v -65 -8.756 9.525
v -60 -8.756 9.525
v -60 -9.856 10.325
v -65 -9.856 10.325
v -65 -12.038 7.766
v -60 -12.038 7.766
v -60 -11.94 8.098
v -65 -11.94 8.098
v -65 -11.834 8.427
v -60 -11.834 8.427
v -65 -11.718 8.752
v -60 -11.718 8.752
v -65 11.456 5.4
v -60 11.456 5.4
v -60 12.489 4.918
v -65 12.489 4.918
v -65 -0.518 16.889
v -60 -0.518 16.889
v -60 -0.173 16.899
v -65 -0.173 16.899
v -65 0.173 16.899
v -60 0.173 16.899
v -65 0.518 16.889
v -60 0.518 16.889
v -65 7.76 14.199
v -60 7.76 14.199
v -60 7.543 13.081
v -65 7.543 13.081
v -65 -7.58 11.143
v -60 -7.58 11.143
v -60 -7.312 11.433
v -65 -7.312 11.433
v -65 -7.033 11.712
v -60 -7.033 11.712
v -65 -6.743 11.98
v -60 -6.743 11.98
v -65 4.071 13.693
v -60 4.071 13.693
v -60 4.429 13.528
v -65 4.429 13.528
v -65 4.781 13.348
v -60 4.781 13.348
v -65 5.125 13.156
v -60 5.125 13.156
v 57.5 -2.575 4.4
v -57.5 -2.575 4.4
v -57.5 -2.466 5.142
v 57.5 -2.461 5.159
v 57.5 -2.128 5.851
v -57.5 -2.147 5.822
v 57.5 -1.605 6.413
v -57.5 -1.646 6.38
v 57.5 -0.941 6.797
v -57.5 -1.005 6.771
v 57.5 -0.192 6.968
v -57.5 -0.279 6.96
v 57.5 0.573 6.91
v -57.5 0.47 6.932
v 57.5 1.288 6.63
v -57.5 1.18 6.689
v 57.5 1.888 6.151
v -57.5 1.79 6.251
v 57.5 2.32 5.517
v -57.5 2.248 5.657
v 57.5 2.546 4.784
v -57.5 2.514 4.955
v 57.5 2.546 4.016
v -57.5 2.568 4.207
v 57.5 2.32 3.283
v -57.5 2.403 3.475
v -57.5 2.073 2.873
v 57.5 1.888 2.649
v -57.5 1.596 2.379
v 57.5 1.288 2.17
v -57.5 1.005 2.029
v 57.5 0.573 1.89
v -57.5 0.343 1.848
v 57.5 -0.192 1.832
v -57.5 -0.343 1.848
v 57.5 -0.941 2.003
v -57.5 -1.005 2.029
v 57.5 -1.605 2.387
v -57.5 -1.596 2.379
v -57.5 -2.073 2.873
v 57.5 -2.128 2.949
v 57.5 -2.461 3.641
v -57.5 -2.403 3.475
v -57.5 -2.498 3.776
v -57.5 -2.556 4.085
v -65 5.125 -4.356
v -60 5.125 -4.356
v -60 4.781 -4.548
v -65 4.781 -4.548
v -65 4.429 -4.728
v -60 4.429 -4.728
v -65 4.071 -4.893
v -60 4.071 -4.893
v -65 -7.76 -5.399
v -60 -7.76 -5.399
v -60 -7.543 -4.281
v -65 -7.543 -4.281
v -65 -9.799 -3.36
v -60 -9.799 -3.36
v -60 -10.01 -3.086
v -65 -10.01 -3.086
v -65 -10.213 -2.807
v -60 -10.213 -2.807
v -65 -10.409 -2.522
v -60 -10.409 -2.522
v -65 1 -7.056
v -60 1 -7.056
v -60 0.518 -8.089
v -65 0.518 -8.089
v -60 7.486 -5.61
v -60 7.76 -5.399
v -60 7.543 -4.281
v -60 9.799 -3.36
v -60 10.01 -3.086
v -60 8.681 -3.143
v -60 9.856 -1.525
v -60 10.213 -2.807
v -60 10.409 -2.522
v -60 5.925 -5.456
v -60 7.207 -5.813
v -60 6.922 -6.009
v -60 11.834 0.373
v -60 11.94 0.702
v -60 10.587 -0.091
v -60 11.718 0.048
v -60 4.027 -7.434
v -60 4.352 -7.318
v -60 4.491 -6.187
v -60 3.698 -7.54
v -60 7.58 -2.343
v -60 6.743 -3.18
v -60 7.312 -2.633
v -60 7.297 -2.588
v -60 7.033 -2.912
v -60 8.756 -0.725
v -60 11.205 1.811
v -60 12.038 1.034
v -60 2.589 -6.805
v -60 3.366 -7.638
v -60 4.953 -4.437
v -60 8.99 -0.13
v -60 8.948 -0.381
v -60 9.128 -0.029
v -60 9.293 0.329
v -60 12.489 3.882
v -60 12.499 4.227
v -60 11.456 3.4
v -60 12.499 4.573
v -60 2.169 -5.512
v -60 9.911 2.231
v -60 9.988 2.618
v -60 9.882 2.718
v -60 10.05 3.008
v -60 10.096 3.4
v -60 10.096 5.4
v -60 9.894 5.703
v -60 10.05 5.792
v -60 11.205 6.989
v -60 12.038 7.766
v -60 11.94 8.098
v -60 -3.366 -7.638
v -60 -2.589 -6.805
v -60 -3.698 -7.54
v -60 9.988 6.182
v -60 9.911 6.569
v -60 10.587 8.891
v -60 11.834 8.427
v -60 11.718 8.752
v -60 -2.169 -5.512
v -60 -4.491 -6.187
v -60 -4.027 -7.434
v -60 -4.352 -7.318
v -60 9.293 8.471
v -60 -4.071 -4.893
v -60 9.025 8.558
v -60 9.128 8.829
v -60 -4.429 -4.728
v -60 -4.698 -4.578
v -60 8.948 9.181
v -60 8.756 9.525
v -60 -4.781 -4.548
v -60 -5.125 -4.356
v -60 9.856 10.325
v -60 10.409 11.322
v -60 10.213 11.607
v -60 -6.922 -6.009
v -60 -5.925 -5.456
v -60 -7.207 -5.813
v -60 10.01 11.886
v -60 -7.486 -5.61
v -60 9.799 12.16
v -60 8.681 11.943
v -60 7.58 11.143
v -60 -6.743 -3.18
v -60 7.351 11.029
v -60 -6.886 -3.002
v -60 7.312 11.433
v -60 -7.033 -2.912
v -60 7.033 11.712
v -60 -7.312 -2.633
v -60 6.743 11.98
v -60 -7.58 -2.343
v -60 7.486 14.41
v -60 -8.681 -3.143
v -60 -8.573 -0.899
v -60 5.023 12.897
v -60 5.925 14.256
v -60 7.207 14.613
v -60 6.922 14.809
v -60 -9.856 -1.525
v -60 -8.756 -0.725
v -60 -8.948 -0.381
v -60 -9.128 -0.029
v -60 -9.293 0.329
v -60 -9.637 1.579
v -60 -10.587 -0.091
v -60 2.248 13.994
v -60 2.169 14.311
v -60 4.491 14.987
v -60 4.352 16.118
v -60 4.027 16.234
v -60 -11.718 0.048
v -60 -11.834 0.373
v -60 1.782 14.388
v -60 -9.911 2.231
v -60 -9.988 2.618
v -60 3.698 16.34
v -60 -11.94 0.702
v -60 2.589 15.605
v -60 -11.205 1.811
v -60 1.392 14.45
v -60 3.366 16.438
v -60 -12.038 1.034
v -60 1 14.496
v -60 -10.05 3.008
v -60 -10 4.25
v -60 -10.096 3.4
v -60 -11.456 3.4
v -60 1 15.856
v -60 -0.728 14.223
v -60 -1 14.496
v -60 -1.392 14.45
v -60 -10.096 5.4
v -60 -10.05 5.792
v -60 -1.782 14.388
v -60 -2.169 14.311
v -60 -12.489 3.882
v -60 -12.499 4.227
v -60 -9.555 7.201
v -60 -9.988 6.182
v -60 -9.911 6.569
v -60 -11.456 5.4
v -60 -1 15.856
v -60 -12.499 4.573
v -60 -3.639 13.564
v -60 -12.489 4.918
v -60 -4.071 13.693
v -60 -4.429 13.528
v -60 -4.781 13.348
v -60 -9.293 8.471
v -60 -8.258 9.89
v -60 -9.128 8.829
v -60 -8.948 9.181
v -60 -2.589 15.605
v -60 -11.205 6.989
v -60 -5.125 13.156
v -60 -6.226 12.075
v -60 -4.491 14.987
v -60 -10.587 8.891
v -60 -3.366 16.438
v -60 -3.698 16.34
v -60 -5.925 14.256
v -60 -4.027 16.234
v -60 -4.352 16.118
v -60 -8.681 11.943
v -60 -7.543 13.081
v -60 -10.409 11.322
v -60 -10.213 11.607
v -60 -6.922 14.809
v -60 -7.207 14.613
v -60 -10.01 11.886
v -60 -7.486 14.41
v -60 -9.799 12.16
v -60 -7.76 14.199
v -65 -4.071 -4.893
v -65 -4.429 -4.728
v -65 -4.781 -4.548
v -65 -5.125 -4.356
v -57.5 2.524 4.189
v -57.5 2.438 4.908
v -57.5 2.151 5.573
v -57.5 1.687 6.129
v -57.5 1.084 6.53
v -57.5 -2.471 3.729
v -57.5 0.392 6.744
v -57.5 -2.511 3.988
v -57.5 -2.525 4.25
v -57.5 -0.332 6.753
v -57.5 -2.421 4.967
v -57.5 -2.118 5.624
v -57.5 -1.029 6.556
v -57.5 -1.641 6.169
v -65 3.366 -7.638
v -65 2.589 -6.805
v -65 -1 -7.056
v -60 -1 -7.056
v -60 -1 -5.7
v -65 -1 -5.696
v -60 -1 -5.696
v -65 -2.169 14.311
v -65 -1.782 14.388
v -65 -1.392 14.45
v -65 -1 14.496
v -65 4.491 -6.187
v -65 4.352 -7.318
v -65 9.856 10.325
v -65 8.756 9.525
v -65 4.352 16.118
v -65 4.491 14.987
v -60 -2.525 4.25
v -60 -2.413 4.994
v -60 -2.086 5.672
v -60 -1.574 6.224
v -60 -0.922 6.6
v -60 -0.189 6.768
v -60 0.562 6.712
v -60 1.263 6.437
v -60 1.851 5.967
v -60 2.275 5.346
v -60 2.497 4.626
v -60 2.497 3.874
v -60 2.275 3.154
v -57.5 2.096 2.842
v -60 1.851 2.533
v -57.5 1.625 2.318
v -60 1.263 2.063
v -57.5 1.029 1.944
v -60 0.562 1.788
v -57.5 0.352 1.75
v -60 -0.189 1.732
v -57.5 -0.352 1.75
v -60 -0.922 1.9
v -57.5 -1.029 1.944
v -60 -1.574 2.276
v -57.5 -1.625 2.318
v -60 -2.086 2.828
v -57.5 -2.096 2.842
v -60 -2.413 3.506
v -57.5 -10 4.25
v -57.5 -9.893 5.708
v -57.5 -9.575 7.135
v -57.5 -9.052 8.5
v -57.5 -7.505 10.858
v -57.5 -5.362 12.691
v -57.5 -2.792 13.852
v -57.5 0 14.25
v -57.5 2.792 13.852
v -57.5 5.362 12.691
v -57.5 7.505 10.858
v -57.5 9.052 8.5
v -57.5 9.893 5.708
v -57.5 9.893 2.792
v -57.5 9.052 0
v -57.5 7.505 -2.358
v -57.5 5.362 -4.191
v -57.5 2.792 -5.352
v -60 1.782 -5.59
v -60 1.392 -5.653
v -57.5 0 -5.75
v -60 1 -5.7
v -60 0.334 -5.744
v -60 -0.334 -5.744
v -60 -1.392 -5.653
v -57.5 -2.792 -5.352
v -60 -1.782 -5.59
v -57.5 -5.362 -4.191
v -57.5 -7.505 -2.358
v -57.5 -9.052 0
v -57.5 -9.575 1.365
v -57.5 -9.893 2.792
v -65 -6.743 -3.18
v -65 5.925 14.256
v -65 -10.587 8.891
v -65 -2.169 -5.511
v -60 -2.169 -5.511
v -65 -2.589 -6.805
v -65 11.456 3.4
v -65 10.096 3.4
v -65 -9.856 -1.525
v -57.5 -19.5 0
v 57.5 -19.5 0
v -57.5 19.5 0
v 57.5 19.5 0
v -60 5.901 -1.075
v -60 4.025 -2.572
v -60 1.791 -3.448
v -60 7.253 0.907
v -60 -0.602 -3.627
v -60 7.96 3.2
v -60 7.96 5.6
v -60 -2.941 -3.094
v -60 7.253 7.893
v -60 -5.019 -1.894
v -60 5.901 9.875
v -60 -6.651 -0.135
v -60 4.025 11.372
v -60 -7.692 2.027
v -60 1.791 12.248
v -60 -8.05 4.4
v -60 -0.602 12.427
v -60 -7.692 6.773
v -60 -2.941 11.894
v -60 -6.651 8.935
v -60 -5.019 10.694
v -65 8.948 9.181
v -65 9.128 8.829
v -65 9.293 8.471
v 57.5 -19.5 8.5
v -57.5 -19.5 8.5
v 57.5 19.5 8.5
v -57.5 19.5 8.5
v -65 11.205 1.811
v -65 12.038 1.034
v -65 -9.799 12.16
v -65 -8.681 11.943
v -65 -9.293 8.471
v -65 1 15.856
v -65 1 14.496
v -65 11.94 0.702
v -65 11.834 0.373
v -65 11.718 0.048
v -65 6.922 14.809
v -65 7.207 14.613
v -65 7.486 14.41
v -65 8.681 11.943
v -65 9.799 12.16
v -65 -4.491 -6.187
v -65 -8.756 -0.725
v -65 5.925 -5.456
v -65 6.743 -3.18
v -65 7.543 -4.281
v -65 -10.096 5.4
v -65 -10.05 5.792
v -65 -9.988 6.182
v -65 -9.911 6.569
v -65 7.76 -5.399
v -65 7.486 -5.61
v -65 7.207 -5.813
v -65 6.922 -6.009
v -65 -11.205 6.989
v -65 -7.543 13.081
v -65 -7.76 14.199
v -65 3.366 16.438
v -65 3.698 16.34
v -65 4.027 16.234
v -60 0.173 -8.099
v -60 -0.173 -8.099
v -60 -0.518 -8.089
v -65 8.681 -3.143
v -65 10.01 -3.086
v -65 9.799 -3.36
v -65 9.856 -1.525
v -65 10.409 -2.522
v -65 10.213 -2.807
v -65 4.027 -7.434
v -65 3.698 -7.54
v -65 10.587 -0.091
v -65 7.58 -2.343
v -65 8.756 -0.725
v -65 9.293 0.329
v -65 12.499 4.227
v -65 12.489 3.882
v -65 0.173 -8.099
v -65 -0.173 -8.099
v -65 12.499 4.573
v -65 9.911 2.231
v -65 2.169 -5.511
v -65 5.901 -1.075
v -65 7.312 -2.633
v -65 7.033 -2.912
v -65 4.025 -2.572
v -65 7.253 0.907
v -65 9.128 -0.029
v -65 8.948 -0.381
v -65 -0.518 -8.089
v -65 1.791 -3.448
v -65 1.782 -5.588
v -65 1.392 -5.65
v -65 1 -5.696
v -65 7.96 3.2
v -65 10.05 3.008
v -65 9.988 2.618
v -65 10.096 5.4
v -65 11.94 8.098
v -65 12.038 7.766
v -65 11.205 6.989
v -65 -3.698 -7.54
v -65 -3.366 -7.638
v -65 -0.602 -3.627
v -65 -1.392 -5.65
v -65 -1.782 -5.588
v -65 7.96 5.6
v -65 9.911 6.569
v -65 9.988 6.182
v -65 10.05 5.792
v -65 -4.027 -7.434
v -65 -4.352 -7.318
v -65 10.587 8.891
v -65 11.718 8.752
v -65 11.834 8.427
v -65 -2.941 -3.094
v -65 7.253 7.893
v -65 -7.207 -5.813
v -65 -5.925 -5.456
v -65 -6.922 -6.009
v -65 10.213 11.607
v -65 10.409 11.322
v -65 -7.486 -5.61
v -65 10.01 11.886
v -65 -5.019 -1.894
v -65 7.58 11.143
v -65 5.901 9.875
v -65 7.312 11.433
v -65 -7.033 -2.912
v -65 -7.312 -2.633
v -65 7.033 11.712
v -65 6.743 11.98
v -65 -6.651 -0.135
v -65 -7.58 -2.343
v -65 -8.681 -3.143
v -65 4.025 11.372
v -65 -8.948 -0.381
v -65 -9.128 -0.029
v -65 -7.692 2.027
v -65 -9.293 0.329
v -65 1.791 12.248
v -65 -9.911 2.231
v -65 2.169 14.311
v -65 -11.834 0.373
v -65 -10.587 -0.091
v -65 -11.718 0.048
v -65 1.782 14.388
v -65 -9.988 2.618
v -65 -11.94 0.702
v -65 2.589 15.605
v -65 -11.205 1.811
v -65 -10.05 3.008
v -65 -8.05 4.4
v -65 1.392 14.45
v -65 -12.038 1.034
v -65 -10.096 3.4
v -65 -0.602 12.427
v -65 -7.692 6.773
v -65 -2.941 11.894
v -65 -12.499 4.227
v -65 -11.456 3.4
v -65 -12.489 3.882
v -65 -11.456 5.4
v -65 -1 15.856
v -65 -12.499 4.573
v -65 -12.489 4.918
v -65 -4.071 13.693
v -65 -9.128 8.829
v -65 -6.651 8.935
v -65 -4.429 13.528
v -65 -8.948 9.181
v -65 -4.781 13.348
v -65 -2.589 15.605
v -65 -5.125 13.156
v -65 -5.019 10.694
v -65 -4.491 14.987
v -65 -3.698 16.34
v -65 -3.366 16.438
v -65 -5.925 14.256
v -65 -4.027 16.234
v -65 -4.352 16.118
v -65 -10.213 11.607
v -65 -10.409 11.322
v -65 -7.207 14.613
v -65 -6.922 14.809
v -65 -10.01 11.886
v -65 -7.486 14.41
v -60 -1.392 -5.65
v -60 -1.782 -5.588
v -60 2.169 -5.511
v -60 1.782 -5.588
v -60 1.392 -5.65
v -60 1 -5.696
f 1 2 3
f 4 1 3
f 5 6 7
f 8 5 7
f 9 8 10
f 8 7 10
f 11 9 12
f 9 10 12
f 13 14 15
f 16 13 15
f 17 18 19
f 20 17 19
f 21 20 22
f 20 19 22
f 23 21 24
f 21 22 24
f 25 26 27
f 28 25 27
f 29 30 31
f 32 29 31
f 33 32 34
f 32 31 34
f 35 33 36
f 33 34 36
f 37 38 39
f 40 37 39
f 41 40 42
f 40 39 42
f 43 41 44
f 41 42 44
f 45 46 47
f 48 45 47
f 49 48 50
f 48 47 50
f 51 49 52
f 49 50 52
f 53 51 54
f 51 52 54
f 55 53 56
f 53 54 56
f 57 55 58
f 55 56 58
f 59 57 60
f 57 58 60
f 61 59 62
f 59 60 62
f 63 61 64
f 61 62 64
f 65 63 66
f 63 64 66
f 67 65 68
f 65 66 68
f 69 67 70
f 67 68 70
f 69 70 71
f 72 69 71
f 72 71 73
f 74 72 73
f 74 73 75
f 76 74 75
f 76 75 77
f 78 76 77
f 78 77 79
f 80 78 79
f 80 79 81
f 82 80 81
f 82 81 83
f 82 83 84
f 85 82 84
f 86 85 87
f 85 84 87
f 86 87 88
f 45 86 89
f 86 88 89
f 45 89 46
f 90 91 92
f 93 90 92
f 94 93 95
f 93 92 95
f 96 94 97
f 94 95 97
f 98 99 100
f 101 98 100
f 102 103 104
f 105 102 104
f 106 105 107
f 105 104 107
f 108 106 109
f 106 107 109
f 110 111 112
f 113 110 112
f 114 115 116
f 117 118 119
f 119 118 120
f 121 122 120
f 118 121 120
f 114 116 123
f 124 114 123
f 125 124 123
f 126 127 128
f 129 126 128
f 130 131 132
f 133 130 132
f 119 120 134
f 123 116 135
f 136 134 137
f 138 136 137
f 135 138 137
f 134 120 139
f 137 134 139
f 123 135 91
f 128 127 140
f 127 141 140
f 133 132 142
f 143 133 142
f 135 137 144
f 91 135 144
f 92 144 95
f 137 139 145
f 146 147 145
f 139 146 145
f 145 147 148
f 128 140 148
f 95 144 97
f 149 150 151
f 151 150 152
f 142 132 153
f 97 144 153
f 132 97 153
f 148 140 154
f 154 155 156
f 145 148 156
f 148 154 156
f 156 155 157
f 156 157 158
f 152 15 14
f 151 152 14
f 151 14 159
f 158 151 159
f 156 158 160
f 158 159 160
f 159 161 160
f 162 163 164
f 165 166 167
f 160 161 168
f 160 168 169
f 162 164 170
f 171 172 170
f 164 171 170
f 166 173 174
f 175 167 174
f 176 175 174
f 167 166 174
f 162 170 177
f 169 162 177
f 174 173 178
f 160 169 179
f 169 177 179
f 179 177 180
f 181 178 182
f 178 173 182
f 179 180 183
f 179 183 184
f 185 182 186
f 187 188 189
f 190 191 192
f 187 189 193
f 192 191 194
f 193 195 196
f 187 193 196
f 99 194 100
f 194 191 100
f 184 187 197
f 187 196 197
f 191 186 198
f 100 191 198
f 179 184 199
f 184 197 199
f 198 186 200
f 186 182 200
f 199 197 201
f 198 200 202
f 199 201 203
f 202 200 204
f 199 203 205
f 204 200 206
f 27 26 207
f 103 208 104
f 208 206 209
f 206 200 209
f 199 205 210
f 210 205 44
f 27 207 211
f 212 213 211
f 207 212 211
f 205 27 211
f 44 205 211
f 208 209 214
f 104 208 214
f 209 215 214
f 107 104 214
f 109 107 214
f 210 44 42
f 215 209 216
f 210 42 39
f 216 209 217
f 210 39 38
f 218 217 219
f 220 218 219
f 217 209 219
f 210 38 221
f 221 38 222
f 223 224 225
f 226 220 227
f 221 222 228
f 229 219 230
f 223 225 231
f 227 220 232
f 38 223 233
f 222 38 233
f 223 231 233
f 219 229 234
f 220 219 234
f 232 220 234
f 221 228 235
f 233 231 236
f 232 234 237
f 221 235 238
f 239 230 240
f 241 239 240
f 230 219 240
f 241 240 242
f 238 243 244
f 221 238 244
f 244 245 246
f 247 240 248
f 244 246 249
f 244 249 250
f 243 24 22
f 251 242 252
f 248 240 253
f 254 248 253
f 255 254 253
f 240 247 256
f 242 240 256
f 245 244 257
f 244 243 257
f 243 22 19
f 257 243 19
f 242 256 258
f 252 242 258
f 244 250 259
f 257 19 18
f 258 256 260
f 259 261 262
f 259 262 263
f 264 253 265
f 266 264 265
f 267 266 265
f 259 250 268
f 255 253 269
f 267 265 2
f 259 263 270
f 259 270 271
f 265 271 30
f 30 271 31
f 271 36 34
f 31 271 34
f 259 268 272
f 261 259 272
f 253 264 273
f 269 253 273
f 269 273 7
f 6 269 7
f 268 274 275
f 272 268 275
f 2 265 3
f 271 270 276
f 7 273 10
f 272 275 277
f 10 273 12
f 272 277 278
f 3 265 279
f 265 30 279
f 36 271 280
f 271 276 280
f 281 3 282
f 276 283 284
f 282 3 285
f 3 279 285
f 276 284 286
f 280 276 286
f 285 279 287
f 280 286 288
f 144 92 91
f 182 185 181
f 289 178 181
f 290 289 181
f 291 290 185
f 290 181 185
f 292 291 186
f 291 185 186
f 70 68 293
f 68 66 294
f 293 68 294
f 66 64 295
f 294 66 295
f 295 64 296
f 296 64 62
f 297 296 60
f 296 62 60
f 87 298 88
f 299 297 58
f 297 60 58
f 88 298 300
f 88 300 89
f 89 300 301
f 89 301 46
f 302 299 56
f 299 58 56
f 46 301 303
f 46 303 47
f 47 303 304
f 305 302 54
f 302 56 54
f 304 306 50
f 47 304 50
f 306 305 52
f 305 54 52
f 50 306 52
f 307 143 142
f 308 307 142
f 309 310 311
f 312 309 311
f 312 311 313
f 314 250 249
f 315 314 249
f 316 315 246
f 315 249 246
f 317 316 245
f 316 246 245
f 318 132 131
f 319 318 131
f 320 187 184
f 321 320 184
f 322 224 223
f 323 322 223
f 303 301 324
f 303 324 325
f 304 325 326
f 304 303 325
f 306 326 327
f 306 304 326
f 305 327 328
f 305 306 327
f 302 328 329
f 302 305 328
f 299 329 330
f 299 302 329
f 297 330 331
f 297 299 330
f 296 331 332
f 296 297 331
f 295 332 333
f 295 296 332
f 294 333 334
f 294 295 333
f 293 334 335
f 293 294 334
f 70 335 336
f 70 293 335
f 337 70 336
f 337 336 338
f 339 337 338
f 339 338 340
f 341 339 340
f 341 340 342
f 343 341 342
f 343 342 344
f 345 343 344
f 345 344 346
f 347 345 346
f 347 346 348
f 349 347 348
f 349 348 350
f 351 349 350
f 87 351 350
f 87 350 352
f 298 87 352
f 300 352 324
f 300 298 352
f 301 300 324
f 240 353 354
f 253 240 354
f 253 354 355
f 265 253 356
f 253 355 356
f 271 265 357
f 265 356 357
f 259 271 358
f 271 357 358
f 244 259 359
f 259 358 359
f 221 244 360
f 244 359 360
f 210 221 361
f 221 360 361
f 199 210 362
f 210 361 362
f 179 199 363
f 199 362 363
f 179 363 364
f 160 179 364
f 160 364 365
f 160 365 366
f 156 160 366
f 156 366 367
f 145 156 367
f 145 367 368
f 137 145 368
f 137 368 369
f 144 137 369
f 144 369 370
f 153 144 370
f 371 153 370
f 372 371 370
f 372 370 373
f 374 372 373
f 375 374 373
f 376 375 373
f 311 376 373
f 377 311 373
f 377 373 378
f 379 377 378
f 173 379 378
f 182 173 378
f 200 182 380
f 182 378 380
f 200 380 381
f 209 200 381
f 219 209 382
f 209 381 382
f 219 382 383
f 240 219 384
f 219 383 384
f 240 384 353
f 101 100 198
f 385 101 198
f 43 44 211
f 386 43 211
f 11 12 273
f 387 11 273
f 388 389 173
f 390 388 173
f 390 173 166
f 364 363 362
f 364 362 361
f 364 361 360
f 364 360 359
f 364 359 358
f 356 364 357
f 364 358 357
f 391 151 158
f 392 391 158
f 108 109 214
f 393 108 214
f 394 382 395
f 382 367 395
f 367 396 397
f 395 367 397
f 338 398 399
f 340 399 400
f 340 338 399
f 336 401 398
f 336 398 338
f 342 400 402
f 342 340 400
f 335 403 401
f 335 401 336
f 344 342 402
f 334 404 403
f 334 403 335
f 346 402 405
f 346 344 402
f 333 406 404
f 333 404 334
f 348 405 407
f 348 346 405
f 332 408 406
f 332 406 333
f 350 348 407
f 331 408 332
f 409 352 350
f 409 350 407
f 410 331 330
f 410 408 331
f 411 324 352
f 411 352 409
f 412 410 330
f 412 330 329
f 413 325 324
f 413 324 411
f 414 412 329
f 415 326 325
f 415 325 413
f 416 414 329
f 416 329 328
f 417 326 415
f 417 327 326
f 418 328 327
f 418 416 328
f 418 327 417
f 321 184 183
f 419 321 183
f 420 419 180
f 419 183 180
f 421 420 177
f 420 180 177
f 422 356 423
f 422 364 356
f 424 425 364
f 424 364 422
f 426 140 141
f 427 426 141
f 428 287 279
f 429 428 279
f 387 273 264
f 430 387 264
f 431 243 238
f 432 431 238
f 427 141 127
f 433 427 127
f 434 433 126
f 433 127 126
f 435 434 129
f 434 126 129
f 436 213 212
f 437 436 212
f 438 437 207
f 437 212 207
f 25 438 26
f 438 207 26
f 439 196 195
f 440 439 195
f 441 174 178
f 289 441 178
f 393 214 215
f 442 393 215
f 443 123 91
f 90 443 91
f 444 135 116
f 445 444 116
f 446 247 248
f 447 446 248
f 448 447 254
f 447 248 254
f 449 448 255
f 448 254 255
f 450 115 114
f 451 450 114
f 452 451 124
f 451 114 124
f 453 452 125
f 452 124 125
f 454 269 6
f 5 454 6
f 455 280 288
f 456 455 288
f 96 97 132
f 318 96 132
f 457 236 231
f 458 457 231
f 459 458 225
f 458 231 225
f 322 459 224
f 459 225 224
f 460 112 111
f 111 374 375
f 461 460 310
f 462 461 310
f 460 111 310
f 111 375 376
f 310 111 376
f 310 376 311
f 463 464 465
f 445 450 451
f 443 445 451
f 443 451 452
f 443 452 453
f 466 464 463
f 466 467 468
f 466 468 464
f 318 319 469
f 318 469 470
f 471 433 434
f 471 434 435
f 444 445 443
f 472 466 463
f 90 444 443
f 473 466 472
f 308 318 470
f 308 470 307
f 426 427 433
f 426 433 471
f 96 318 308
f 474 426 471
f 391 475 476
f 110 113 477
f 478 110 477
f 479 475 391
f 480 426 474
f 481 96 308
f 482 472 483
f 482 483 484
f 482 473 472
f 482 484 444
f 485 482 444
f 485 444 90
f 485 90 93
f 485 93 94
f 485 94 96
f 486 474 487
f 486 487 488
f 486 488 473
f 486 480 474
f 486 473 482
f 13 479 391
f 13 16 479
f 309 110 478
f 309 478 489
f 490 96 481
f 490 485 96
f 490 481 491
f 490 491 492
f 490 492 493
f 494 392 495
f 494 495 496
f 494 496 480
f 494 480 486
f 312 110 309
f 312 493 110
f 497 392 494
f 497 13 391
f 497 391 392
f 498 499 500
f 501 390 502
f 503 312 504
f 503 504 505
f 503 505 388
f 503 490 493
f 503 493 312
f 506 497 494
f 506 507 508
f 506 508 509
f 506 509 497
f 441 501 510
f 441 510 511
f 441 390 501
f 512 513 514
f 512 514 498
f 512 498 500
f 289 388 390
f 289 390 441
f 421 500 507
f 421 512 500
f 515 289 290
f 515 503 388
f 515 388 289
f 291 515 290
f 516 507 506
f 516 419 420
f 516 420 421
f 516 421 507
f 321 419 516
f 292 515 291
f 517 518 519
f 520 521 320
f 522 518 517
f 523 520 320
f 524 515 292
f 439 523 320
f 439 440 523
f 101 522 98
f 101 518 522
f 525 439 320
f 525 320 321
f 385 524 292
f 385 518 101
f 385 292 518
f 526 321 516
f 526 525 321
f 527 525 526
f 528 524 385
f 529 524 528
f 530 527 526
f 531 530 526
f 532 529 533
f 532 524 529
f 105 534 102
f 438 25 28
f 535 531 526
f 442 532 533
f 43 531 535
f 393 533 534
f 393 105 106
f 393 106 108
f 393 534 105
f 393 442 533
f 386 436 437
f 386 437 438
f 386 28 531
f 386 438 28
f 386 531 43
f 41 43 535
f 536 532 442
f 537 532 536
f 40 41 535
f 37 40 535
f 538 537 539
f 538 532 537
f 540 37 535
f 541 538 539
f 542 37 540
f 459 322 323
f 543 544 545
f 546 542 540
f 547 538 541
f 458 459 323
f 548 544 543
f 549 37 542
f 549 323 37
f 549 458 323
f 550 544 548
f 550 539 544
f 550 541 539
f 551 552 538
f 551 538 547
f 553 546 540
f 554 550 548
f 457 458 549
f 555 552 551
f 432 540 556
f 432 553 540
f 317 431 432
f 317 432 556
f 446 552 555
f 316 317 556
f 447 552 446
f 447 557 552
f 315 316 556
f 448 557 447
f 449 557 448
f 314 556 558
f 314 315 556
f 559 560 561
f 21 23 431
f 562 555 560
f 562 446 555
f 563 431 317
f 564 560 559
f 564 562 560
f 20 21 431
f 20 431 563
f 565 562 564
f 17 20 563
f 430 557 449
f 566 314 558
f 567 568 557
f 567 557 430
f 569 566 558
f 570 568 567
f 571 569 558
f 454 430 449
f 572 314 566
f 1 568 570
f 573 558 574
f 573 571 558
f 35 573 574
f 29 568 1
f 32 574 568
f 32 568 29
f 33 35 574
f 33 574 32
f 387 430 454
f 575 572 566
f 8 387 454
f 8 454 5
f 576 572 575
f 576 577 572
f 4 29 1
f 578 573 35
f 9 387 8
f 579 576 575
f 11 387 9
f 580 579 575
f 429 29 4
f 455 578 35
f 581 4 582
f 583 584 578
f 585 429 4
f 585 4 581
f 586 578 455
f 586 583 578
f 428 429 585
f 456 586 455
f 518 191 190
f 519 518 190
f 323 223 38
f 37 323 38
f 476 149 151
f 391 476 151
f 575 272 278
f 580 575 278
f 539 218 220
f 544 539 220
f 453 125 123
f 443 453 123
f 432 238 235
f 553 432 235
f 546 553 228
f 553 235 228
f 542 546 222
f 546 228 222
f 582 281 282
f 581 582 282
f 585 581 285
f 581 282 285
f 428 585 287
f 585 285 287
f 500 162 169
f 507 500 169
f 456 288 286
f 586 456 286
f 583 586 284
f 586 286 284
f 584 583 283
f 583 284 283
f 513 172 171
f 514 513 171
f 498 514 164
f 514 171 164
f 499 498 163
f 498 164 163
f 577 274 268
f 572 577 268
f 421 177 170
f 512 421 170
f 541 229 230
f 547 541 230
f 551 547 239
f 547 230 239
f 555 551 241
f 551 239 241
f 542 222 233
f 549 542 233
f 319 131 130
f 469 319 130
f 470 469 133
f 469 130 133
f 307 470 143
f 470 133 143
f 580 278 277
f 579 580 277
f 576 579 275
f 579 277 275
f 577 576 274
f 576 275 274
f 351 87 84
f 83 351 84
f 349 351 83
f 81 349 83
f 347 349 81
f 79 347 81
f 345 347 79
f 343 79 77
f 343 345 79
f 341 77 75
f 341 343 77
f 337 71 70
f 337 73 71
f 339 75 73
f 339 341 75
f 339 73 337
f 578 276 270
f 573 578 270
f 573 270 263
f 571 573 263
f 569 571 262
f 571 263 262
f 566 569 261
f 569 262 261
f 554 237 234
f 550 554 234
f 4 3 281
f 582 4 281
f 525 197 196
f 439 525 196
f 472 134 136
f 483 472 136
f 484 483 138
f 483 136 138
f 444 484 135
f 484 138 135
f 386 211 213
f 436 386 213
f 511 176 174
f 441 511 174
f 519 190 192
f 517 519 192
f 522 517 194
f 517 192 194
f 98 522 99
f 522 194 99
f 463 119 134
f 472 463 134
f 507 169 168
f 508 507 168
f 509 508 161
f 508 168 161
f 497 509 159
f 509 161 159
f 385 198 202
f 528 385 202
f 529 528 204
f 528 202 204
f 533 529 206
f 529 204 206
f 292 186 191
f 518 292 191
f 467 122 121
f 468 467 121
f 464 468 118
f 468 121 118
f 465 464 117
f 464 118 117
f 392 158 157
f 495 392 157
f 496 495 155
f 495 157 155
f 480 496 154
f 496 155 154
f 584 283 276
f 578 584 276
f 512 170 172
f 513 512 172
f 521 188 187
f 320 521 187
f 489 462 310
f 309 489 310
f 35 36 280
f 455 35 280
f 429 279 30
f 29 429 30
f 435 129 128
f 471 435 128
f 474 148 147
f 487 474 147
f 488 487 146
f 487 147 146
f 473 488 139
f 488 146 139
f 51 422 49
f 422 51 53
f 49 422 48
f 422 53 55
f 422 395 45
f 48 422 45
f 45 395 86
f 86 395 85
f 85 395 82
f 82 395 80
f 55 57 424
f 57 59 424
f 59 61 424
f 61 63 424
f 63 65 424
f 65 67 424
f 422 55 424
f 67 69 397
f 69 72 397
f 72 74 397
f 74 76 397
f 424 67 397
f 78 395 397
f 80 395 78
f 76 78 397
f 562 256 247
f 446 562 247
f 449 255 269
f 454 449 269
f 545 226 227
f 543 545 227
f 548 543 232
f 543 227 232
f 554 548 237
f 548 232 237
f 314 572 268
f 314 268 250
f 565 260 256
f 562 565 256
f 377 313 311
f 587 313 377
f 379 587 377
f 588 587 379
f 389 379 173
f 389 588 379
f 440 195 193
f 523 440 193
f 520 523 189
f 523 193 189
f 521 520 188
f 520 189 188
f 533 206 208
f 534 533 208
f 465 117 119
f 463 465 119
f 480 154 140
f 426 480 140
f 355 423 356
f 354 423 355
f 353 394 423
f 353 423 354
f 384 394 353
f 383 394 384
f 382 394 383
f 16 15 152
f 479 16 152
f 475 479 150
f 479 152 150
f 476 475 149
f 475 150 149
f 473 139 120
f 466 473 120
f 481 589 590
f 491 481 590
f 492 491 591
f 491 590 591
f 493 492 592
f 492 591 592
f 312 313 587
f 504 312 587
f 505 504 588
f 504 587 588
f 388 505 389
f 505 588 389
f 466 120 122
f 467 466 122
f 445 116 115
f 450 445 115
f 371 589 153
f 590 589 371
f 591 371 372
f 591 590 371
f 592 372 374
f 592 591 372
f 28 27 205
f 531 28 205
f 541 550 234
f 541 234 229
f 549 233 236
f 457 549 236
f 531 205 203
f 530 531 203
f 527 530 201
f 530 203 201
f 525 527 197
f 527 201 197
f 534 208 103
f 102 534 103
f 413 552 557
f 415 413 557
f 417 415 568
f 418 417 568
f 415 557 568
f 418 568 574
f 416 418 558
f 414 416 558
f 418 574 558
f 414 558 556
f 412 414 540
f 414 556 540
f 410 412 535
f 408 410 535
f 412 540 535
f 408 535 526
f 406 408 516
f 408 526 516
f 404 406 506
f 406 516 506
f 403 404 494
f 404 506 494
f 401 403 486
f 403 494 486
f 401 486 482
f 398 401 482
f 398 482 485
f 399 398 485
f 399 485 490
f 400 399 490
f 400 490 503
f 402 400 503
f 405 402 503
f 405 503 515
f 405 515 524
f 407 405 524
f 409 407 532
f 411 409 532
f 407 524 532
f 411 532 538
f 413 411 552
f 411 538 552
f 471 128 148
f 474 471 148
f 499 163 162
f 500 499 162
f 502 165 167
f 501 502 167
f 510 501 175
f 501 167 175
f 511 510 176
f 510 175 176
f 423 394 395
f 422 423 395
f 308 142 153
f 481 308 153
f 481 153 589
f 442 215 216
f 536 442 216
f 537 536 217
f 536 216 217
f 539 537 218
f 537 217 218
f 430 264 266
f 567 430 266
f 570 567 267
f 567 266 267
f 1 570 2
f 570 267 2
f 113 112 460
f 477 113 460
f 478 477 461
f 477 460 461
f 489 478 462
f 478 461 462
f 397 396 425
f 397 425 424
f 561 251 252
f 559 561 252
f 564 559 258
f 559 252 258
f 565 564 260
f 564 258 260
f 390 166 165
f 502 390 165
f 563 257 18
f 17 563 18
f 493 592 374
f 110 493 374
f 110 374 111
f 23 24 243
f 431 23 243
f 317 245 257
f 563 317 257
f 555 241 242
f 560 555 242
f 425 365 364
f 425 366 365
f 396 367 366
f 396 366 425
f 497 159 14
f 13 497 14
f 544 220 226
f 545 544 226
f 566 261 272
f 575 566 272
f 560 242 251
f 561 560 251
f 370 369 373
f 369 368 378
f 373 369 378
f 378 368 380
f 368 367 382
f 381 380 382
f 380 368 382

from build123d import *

# Parameters (mm, degrees)
F0_W     = 115
F0_H     = 39
F1_DEPTH = 8.5
F2_R     = 10
F2_R_2   = 2.525
F3_DEPTH = 2.5
F4_R     = 2.575
F5_DEPTH = 115.001
F7_DEPTH = 5
F8_R     = 8.05
F9_DEPTH = 5


with BuildPart() as f1:
    # F0 (on Top) → F1 (new body)
    with BuildSketch(Plane.XY):
        Rectangle(F0_W, F0_H)
    extrude(amount=F1_DEPTH)

    # F2 (on face) → F3 (join)
    with BuildSketch(Plane(origin=(-57.5, 0, 0), x_dir=(0, -1, 0), z_dir=(-1, 0, 0))):
        with Locations((0, 4.25)):
            Circle(F2_R)
        with Locations((0, 4.25)):
            Circle(F2_R_2, mode=Mode.SUBTRACT)
    extrude(amount=F3_DEPTH)

    # F4 (on face) → F5 (cut, through all)
    with BuildSketch(Plane(origin=(-57.5, 0, 0), x_dir=(0, -1, 0), z_dir=(-1, 0, 0))):
        with Locations((0, 4.4)):
            Circle(F4_R)
    extrude(amount=-F5_DEPTH, mode=Mode.SUBTRACT)

    # F6 (on face) → F7 (join)
    with BuildSketch(Plane(origin=(-60, 0, 0), x_dir=(0, -1, 0), z_dir=(-1, 0, 0))):
        with BuildLine():
            ThreePointArc((0.518394, 16.889246), (0, 16.9), (-0.518394, 16.889246))
            Line((-0.518394, 16.889246), (-1, 15.856439))
            Line((-1, 15.856439), (-1, 14.496058))
            ThreePointArc((-1, 14.496058), (-1.5871, 14.420554), (-2.168797, 14.310939))
            Line((-2.168797, 14.310939), (-2.589178, 15.604738))
            Line((-2.589178, 15.604738), (-3.366367, 16.438171))
            ThreePointArc((-3.366367, 16.438171), (-3.862712, 16.288206), (-4.352412, 16.117786))
            Line((-4.352412, 16.117786), (-4.491291, 14.986704))
            Line((-4.491291, 14.986704), (-4.07091, 13.692905))
            ThreePointArc((-4.07091, 13.692905), (-4.605943, 13.439672), (-5.125297, 13.155668))
            Line((-5.125297, 13.155668), (-5.924909, 14.256239))
            Line((-5.924909, 14.256239), (-6.921605, 14.808717))
            ThreePointArc((-6.921605, 14.808717), (-7.347316, 14.512712), (-7.760384, 14.199308))
            Line((-7.760384, 14.199308), (-7.542943, 13.080669))
            Line((-7.542943, 13.080669), (-6.743331, 11.980097))
            ThreePointArc((-6.743331, 11.980097), (-7.173924, 11.573924), (-7.580097, 11.143331))
            Line((-7.580097, 11.143331), (-8.680669, 11.942943))
            Line((-8.680669, 11.942943), (-9.799308, 12.160384))
            ThreePointArc((-9.799308, 12.160384), (-10.112712, 11.747316), (-10.408717, 11.321605))
            Line((-10.408717, 11.321605), (-9.856239, 10.324909))
            Line((-9.856239, 10.324909), (-8.755668, 9.525297))
            ThreePointArc((-8.755668, 9.525297), (-9.039672, 9.005943), (-9.292905, 8.47091))
            Line((-9.292905, 8.47091), (-10.586704, 8.891291))
            Line((-10.586704, 8.891291), (-11.717786, 8.752412))
            ThreePointArc((-11.717786, 8.752412), (-11.888206, 8.262712), (-12.038171, 7.766367))
            Line((-12.038171, 7.766367), (-11.204738, 6.989178))
            Line((-11.204738, 6.989178), (-9.910939, 6.568797))
            ThreePointArc((-9.910939, 6.568797), (-10.020554, 5.9871), (-10.096058, 5.4))
            Line((-10.096058, 5.4), (-11.456439, 5.4))
            Line((-11.456439, 5.4), (-12.489246, 4.918394))
            ThreePointArc((-12.489246, 4.918394), (-12.5, 4.4), (-12.489246, 3.881606))
            Line((-12.489246, 3.881606), (-11.456439, 3.4))
            Line((-11.456439, 3.4), (-10.096058, 3.4))
            ThreePointArc((-10.096058, 3.4), (-10.020554, 2.8129), (-9.910939, 2.231203))
            Line((-9.910939, 2.231203), (-11.204738, 1.810822))
            Line((-11.204738, 1.810822), (-12.038171, 1.033633))
            ThreePointArc((-12.038171, 1.033633), (-11.888206, 0.537288), (-11.717786, 0.047588))
            Line((-11.717786, 0.047588), (-10.586704, -0.091291))
            Line((-10.586704, -0.091291), (-9.292905, 0.32909))
            ThreePointArc((-9.292905, 0.32909), (-9.039672, -0.205943), (-8.755668, -0.725297))
            Line((-8.755668, -0.725297), (-9.856239, -1.524909))
            Line((-9.856239, -1.524909), (-10.408717, -2.521605))
            ThreePointArc((-10.408717, -2.521605), (-10.112712, -2.947316), (-9.799308, -3.360384))
            Line((-9.799308, -3.360384), (-8.680669, -3.142943))
            Line((-8.680669, -3.142943), (-7.580097, -2.343331))
            ThreePointArc((-7.580097, -2.343331), (-7.173924, -2.773924), (-6.743331, -3.180097))
            Line((-6.743331, -3.180097), (-7.542943, -4.280669))
            Line((-7.542943, -4.280669), (-7.760384, -5.399308))
            ThreePointArc((-7.760384, -5.399308), (-7.347316, -5.712712), (-6.921605, -6.008717))
            Line((-6.921605, -6.008717), (-5.924909, -5.456239))
            Line((-5.924909, -5.456239), (-5.125297, -4.355668))
            ThreePointArc((-5.125297, -4.355668), (-4.605943, -4.639672), (-4.07091, -4.892905))
            Line((-4.07091, -4.892905), (-4.491291, -6.186704))
            Line((-4.491291, -6.186704), (-4.352412, -7.317786))
            ThreePointArc((-4.352412, -7.317786), (-3.862712, -7.488206), (-3.366367, -7.638171))
            Line((-3.366367, -7.638171), (-2.589178, -6.804738))
            Line((-2.589178, -6.804738), (-2.168797, -5.510939))
            ThreePointArc((-2.168797, -5.510939), (-1.5871, -5.620554), (-1, -5.696058))
            Line((-1, -5.696058), (-1, -7.056439))
            Line((-1, -7.056439), (-0.518394, -8.089246))
            ThreePointArc((-0.518394, -8.089246), (0, -8.1), (0.518394, -8.089246))
            Line((0.518394, -8.089246), (1, -7.056439))
            Line((1, -7.056439), (1, -5.696058))
            ThreePointArc((1, -5.696058), (1.5871, -5.620554), (2.168797, -5.510939))
            Line((2.168797, -5.510939), (2.589178, -6.804738))
            Line((2.589178, -6.804738), (3.366367, -7.638171))
            ThreePointArc((3.366367, -7.638171), (3.862712, -7.488206), (4.352412, -7.317786))
            Line((4.352412, -7.317786), (4.491291, -6.186704))
            Line((4.491291, -6.186704), (4.07091, -4.892905))
            ThreePointArc((4.07091, -4.892905), (4.605943, -4.639672), (5.125297, -4.355668))
            Line((5.125297, -4.355668), (5.924909, -5.456239))
            Line((5.924909, -5.456239), (6.921605, -6.008717))
            ThreePointArc((6.921605, -6.008717), (7.347316, -5.712712), (7.760384, -5.399308))
            Line((7.760384, -5.399308), (7.542943, -4.280669))
            Line((7.542943, -4.280669), (6.743331, -3.180097))
            ThreePointArc((6.743331, -3.180097), (7.173924, -2.773924), (7.580097, -2.343331))
            Line((7.580097, -2.343331), (8.680669, -3.142943))
            Line((8.680669, -3.142943), (9.799308, -3.360384))
            ThreePointArc((9.799308, -3.360384), (10.112712, -2.947316), (10.408717, -2.521605))
            Line((10.408717, -2.521605), (9.856239, -1.524909))
            Line((9.856239, -1.524909), (8.755668, -0.725297))
            ThreePointArc((8.755668, -0.725297), (9.039672, -0.205943), (9.292905, 0.32909))
            Line((9.292905, 0.32909), (10.586704, -0.091291))
            Line((10.586704, -0.091291), (11.717786, 0.047588))
            ThreePointArc((11.717786, 0.047588), (11.888206, 0.537288), (12.038171, 1.033633))
            Line((12.038171, 1.033633), (11.204738, 1.810822))
            Line((11.204738, 1.810822), (9.910939, 2.231203))
            ThreePointArc((9.910939, 2.231203), (10.020554, 2.8129), (10.096058, 3.4))
            Line((10.096058, 3.4), (11.456439, 3.4))
            Line((11.456439, 3.4), (12.489246, 3.881606))
            ThreePointArc((12.489246, 3.881606), (12.5, 4.4), (12.489246, 4.918394))
            Line((12.489246, 4.918394), (11.456439, 5.4))
            Line((11.456439, 5.4), (10.096058, 5.4))
            ThreePointArc((10.096058, 5.4), (10.020554, 5.9871), (9.910939, 6.568797))
            Line((9.910939, 6.568797), (11.204738, 6.989178))
            Line((11.204738, 6.989178), (12.038171, 7.766367))
            ThreePointArc((12.038171, 7.766367), (11.888206, 8.262712), (11.717786, 8.752412))
            Line((11.717786, 8.752412), (10.586704, 8.891291))
            Line((10.586704, 8.891291), (9.292905, 8.47091))
            ThreePointArc((9.292905, 8.47091), (9.039672, 9.005943), (8.755668, 9.525297))
            Line((8.755668, 9.525297), (9.856239, 10.324909))
            Line((9.856239, 10.324909), (10.408717, 11.321605))
            ThreePointArc((10.408717, 11.321605), (10.112712, 11.747316), (9.799308, 12.160384))
            Line((9.799308, 12.160384), (8.680669, 11.942943))
            Line((8.680669, 11.942943), (7.580097, 11.143331))
            ThreePointArc((7.580097, 11.143331), (7.173924, 11.573924), (6.743331, 11.980097))
            Line((6.743331, 11.980097), (7.542943, 13.080669))
            Line((7.542943, 13.080669), (7.760384, 14.199308))
            ThreePointArc((7.760384, 14.199308), (7.347316, 14.512712), (6.921605, 14.808717))
            Line((6.921605, 14.808717), (5.924909, 14.256239))
            Line((5.924909, 14.256239), (5.125297, 13.155668))
            ThreePointArc((5.125297, 13.155668), (4.605943, 13.439672), (4.07091, 13.692905))
            Line((4.07091, 13.692905), (4.491291, 14.986704))
            Line((4.491291, 14.986704), (4.352412, 16.117786))
            ThreePointArc((4.352412, 16.117786), (3.862712, 16.288206), (3.366367, 16.438171))
            Line((3.366367, 16.438171), (2.589178, 15.604738))
            Line((2.589178, 15.604738), (2.168797, 14.310939))
            ThreePointArc((2.168797, 14.310939), (1.5871, 14.420554), (1, 14.496058))
            Line((1, 14.496058), (1, 15.856439))
            Line((1, 15.856439), (0.518394, 16.889246))
        make_face()
    extrude(amount=F7_DEPTH)

    # F8 (on face) → F9 (cut)
    with BuildSketch(Plane(origin=(-65, 0, 0), x_dir=(0, -1, 0), z_dir=(-1, 0, 0))):
        with Locations((0, 4.4)):
            Circle(F8_R)
    extrude(amount=-F9_DEPTH, mode=Mode.SUBTRACT)


solid = f1.part
